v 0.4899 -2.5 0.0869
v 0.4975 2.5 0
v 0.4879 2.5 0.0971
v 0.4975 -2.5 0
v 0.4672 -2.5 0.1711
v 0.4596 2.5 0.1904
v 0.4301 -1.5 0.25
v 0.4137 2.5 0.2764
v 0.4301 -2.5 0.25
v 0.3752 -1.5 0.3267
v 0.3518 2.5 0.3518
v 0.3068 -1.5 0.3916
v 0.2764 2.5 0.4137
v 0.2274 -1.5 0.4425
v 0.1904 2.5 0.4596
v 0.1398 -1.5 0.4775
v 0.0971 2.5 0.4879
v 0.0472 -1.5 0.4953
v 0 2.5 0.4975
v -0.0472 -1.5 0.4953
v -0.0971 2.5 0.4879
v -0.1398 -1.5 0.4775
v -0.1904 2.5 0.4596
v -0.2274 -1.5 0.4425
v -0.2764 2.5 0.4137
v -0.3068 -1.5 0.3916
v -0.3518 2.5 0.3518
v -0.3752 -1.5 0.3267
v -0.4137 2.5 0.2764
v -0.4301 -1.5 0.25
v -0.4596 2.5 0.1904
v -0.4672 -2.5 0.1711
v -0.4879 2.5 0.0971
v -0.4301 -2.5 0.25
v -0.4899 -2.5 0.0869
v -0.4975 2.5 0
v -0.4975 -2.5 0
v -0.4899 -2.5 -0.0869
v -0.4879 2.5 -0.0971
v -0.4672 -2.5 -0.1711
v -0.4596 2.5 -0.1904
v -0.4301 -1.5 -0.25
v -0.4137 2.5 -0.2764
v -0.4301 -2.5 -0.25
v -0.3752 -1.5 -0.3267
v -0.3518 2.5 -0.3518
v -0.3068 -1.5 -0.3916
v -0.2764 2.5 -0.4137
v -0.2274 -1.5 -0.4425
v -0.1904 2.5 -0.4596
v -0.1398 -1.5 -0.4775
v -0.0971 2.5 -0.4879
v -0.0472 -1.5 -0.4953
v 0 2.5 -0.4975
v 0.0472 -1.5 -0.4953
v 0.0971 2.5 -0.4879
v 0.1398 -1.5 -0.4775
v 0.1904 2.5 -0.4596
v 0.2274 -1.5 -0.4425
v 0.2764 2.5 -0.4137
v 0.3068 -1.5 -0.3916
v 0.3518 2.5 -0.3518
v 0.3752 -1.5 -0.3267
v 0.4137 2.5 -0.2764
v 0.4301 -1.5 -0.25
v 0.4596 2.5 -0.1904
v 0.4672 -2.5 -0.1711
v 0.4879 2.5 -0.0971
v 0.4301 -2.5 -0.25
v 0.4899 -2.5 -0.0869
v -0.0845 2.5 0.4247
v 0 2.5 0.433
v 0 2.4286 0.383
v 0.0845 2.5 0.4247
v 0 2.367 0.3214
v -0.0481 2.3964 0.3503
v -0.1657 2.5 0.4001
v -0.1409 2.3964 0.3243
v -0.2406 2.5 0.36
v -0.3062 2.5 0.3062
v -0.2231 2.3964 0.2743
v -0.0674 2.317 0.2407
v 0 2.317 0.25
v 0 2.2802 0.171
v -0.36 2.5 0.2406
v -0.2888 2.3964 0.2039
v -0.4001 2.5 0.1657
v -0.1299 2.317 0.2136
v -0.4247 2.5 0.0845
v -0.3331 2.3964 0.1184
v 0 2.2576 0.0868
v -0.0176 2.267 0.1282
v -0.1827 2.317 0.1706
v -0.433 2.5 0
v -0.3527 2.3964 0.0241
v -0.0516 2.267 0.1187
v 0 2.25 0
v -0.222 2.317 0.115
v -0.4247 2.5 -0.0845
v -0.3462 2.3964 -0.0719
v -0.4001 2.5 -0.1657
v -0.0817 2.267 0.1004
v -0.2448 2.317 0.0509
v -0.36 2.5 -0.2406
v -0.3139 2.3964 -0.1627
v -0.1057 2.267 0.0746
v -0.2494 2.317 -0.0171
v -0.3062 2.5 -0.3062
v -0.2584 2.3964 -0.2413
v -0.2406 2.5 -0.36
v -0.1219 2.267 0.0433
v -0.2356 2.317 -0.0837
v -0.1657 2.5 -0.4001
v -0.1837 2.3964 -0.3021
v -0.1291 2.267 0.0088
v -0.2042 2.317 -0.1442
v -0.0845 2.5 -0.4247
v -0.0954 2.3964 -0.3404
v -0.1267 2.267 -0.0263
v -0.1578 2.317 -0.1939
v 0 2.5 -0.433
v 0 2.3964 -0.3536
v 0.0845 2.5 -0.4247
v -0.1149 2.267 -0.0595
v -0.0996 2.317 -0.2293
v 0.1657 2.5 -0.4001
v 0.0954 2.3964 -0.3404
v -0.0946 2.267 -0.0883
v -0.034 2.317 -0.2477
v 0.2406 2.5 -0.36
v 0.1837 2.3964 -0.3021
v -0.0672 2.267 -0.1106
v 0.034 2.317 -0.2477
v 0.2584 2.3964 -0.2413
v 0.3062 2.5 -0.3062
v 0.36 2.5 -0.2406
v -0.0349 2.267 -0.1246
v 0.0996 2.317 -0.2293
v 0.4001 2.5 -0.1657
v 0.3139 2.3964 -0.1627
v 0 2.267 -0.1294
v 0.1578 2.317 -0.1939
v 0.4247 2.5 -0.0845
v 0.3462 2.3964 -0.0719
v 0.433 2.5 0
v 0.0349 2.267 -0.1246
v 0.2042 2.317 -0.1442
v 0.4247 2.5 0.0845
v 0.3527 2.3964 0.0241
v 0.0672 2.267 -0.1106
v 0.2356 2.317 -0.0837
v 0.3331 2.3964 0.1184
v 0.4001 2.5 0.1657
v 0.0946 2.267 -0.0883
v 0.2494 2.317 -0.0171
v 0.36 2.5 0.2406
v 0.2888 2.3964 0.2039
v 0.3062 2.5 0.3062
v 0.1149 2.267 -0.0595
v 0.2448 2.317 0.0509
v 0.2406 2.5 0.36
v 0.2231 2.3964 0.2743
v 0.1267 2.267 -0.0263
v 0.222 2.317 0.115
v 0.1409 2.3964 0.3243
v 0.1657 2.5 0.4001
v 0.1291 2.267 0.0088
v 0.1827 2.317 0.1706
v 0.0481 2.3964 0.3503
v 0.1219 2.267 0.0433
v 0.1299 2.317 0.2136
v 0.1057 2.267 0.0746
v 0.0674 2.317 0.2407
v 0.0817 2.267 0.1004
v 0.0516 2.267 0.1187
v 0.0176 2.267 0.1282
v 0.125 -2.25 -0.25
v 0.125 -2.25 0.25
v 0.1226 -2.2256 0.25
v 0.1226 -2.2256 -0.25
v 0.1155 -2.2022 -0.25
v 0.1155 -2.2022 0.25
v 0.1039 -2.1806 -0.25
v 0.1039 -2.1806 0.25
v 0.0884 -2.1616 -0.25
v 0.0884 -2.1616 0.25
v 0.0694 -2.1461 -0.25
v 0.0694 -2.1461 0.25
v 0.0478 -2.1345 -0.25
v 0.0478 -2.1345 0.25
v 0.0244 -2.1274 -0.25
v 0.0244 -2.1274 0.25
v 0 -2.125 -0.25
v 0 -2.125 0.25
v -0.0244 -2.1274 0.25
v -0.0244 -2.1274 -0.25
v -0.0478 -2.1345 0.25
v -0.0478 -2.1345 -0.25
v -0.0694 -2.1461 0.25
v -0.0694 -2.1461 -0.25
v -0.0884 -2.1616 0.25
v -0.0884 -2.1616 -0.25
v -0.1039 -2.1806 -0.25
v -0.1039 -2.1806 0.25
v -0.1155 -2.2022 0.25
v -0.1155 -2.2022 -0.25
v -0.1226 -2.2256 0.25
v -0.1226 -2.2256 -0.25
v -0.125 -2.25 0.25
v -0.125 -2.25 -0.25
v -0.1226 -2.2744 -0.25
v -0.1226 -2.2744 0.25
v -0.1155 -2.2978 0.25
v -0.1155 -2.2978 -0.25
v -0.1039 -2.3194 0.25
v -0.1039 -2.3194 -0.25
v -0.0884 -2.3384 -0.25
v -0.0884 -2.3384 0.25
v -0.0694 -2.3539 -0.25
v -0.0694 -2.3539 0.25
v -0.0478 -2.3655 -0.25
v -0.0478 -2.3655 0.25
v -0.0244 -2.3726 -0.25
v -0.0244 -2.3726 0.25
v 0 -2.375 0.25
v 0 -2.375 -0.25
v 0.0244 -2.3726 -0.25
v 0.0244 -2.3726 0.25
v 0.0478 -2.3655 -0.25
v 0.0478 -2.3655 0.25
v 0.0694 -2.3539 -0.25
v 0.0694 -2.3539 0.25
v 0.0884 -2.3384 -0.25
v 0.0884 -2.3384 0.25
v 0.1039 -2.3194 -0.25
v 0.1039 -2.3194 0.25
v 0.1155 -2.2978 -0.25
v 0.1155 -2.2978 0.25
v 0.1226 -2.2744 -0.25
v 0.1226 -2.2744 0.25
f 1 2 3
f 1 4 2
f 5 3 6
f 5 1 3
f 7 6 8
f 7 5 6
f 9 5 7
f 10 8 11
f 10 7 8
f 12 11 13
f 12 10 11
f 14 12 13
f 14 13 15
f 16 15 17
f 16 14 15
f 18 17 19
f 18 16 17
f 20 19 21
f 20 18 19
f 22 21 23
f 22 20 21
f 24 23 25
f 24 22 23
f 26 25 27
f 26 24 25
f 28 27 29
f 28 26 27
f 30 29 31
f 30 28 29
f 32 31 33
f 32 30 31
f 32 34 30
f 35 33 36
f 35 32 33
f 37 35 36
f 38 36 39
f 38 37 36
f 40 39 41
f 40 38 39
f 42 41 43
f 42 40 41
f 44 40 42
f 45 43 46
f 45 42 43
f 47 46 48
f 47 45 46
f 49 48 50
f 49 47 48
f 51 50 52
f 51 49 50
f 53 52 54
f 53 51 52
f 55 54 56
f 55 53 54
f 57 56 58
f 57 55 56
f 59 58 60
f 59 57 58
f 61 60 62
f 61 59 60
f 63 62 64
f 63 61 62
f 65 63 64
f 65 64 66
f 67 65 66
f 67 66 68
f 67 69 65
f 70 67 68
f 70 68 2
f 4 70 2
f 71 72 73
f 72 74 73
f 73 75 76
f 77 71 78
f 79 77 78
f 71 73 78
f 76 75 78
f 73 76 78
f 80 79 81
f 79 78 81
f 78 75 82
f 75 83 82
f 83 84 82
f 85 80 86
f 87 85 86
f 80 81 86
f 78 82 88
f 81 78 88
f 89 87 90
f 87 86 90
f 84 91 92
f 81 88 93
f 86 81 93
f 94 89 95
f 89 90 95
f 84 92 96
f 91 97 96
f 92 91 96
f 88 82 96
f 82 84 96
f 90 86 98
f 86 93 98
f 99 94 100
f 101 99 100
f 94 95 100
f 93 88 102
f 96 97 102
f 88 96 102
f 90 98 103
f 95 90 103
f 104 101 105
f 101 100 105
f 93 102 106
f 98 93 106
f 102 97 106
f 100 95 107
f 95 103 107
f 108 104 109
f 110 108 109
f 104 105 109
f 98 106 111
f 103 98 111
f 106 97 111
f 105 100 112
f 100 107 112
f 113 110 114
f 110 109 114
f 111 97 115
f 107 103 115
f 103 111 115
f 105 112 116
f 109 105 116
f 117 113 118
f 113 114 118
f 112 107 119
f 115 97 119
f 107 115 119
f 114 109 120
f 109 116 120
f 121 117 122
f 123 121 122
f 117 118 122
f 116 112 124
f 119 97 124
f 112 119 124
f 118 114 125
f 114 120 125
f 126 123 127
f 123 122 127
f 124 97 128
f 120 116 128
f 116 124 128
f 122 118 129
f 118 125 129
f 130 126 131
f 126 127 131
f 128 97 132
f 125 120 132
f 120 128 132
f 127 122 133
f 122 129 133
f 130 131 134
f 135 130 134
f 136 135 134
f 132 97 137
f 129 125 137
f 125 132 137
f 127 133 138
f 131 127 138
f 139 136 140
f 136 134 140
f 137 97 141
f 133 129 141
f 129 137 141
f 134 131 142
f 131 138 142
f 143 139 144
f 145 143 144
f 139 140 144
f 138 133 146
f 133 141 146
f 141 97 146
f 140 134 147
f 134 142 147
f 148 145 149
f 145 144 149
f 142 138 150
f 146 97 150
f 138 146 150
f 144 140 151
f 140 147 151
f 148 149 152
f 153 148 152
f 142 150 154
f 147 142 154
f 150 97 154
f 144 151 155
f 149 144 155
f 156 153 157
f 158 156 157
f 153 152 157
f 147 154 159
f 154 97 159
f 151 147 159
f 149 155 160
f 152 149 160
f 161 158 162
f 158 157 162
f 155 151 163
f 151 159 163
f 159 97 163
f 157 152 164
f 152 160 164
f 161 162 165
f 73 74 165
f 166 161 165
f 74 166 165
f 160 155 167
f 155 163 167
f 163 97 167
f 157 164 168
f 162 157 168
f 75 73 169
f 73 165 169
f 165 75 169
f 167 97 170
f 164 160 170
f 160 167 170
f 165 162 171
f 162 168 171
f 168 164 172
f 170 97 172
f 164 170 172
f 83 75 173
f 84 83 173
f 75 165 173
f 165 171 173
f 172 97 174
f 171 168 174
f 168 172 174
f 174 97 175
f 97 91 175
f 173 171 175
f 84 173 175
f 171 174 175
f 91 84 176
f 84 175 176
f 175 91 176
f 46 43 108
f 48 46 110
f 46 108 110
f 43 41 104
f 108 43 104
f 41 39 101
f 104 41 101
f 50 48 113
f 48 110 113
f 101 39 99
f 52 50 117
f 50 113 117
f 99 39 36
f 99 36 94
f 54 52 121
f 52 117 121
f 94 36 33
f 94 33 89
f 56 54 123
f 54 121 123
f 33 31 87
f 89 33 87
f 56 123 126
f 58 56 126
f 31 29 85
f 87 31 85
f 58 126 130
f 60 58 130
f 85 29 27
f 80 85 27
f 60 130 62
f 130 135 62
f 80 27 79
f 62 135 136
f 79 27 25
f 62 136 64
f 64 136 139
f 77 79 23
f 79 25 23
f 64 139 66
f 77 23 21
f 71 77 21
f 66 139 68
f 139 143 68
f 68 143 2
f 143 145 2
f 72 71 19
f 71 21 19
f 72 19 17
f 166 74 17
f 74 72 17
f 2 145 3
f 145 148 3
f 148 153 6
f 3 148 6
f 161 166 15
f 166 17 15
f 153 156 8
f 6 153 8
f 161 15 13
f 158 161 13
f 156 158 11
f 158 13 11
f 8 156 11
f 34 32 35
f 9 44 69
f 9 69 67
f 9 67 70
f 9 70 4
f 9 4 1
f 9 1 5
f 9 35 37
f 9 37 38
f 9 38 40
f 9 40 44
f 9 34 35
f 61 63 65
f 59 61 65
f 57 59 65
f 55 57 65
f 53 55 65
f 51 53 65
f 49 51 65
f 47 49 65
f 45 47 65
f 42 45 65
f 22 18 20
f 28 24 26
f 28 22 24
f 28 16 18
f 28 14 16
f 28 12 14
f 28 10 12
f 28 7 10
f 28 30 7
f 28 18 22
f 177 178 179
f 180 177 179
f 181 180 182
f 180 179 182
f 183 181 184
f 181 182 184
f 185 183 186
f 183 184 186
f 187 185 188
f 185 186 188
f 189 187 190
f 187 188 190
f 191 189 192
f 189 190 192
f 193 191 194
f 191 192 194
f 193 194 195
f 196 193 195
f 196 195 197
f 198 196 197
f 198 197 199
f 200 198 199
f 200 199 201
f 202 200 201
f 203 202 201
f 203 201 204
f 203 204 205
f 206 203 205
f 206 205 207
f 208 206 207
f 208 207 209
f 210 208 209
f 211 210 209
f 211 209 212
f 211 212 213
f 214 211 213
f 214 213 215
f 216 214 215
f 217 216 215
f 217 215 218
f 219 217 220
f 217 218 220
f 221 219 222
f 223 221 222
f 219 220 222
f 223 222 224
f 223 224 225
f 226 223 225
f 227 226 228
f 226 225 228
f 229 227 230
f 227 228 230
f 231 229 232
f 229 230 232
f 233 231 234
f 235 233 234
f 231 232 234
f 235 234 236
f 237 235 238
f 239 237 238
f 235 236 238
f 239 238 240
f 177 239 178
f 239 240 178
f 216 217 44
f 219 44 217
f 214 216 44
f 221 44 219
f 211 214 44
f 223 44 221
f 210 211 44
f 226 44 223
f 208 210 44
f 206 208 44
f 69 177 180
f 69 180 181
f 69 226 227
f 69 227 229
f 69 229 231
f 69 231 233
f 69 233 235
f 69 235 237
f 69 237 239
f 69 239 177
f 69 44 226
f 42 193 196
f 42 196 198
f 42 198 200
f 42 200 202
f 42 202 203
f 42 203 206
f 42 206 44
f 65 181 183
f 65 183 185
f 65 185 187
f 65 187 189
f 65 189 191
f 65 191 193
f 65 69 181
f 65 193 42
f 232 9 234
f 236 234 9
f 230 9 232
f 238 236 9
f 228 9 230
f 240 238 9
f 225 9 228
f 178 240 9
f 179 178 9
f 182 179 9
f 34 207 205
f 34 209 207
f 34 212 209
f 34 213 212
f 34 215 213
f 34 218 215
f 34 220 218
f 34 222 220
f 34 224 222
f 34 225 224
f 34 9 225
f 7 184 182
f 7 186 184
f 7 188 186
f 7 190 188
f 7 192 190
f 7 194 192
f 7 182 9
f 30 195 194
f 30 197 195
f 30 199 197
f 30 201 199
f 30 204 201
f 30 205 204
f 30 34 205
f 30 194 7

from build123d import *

# Parameters (mm, degrees)
F0_R          = 0.4975
F1_DEPTH      = 2.5
F2_W          = 1
F2_H          = 0.4777815267
F2_H_2        = 0.6547255735
F3_DEPTH      = 0.4985
F3_DEPTH_BACK = 0.4985
F6_R          = 0.125
F7_DEPTH      = 25


with BuildPart() as f1:
    # F0 (on Front) → F1 (new body, symmetric)
    with BuildSketch(Plane.XZ):
        Circle(F0_R)
    extrude(amount=F1_DEPTH, both=True)

    # F2 (on Right) → F3 (cut, two sides)
    with BuildSketch(Plane.YZ) as f3_sk:
        with Locations((-2, 0.4888907634)):
            Rectangle(F2_W, F2_H)
        with Locations((-2, -0.5773627867)):
            Rectangle(F2_W, F2_H_2)
    extrude(amount=-F3_DEPTH, mode=Mode.SUBTRACT)
    extrude(f3_sk.sketch, amount=F3_DEPTH_BACK, mode=Mode.SUBTRACT)

    # F4 (on Right) → F5 (revolve, cut)
    with BuildSketch(Plane.YZ):
        with BuildLine():
            Line((2.5, 0), (2.5, 0.4330127019))
            ThreePointArc((2.5, 0.4330127019), (2.3169872981, 0.25), (2.25, 0))
            Line((2.25, 0), (2.5, 0))
        make_face()
    revolve(axis=Axis((0, 2.375, 0), (0, -1, 0)), mode=Mode.SUBTRACT)

    # F6 (on face) → F7 (cut)
    with BuildSketch(Plane.XY.offset(0.25)):
        with Locations((0, -2.25)):
            Circle(F6_R)
    extrude(amount=-F7_DEPTH, mode=Mode.SUBTRACT)


solid = f1.part
